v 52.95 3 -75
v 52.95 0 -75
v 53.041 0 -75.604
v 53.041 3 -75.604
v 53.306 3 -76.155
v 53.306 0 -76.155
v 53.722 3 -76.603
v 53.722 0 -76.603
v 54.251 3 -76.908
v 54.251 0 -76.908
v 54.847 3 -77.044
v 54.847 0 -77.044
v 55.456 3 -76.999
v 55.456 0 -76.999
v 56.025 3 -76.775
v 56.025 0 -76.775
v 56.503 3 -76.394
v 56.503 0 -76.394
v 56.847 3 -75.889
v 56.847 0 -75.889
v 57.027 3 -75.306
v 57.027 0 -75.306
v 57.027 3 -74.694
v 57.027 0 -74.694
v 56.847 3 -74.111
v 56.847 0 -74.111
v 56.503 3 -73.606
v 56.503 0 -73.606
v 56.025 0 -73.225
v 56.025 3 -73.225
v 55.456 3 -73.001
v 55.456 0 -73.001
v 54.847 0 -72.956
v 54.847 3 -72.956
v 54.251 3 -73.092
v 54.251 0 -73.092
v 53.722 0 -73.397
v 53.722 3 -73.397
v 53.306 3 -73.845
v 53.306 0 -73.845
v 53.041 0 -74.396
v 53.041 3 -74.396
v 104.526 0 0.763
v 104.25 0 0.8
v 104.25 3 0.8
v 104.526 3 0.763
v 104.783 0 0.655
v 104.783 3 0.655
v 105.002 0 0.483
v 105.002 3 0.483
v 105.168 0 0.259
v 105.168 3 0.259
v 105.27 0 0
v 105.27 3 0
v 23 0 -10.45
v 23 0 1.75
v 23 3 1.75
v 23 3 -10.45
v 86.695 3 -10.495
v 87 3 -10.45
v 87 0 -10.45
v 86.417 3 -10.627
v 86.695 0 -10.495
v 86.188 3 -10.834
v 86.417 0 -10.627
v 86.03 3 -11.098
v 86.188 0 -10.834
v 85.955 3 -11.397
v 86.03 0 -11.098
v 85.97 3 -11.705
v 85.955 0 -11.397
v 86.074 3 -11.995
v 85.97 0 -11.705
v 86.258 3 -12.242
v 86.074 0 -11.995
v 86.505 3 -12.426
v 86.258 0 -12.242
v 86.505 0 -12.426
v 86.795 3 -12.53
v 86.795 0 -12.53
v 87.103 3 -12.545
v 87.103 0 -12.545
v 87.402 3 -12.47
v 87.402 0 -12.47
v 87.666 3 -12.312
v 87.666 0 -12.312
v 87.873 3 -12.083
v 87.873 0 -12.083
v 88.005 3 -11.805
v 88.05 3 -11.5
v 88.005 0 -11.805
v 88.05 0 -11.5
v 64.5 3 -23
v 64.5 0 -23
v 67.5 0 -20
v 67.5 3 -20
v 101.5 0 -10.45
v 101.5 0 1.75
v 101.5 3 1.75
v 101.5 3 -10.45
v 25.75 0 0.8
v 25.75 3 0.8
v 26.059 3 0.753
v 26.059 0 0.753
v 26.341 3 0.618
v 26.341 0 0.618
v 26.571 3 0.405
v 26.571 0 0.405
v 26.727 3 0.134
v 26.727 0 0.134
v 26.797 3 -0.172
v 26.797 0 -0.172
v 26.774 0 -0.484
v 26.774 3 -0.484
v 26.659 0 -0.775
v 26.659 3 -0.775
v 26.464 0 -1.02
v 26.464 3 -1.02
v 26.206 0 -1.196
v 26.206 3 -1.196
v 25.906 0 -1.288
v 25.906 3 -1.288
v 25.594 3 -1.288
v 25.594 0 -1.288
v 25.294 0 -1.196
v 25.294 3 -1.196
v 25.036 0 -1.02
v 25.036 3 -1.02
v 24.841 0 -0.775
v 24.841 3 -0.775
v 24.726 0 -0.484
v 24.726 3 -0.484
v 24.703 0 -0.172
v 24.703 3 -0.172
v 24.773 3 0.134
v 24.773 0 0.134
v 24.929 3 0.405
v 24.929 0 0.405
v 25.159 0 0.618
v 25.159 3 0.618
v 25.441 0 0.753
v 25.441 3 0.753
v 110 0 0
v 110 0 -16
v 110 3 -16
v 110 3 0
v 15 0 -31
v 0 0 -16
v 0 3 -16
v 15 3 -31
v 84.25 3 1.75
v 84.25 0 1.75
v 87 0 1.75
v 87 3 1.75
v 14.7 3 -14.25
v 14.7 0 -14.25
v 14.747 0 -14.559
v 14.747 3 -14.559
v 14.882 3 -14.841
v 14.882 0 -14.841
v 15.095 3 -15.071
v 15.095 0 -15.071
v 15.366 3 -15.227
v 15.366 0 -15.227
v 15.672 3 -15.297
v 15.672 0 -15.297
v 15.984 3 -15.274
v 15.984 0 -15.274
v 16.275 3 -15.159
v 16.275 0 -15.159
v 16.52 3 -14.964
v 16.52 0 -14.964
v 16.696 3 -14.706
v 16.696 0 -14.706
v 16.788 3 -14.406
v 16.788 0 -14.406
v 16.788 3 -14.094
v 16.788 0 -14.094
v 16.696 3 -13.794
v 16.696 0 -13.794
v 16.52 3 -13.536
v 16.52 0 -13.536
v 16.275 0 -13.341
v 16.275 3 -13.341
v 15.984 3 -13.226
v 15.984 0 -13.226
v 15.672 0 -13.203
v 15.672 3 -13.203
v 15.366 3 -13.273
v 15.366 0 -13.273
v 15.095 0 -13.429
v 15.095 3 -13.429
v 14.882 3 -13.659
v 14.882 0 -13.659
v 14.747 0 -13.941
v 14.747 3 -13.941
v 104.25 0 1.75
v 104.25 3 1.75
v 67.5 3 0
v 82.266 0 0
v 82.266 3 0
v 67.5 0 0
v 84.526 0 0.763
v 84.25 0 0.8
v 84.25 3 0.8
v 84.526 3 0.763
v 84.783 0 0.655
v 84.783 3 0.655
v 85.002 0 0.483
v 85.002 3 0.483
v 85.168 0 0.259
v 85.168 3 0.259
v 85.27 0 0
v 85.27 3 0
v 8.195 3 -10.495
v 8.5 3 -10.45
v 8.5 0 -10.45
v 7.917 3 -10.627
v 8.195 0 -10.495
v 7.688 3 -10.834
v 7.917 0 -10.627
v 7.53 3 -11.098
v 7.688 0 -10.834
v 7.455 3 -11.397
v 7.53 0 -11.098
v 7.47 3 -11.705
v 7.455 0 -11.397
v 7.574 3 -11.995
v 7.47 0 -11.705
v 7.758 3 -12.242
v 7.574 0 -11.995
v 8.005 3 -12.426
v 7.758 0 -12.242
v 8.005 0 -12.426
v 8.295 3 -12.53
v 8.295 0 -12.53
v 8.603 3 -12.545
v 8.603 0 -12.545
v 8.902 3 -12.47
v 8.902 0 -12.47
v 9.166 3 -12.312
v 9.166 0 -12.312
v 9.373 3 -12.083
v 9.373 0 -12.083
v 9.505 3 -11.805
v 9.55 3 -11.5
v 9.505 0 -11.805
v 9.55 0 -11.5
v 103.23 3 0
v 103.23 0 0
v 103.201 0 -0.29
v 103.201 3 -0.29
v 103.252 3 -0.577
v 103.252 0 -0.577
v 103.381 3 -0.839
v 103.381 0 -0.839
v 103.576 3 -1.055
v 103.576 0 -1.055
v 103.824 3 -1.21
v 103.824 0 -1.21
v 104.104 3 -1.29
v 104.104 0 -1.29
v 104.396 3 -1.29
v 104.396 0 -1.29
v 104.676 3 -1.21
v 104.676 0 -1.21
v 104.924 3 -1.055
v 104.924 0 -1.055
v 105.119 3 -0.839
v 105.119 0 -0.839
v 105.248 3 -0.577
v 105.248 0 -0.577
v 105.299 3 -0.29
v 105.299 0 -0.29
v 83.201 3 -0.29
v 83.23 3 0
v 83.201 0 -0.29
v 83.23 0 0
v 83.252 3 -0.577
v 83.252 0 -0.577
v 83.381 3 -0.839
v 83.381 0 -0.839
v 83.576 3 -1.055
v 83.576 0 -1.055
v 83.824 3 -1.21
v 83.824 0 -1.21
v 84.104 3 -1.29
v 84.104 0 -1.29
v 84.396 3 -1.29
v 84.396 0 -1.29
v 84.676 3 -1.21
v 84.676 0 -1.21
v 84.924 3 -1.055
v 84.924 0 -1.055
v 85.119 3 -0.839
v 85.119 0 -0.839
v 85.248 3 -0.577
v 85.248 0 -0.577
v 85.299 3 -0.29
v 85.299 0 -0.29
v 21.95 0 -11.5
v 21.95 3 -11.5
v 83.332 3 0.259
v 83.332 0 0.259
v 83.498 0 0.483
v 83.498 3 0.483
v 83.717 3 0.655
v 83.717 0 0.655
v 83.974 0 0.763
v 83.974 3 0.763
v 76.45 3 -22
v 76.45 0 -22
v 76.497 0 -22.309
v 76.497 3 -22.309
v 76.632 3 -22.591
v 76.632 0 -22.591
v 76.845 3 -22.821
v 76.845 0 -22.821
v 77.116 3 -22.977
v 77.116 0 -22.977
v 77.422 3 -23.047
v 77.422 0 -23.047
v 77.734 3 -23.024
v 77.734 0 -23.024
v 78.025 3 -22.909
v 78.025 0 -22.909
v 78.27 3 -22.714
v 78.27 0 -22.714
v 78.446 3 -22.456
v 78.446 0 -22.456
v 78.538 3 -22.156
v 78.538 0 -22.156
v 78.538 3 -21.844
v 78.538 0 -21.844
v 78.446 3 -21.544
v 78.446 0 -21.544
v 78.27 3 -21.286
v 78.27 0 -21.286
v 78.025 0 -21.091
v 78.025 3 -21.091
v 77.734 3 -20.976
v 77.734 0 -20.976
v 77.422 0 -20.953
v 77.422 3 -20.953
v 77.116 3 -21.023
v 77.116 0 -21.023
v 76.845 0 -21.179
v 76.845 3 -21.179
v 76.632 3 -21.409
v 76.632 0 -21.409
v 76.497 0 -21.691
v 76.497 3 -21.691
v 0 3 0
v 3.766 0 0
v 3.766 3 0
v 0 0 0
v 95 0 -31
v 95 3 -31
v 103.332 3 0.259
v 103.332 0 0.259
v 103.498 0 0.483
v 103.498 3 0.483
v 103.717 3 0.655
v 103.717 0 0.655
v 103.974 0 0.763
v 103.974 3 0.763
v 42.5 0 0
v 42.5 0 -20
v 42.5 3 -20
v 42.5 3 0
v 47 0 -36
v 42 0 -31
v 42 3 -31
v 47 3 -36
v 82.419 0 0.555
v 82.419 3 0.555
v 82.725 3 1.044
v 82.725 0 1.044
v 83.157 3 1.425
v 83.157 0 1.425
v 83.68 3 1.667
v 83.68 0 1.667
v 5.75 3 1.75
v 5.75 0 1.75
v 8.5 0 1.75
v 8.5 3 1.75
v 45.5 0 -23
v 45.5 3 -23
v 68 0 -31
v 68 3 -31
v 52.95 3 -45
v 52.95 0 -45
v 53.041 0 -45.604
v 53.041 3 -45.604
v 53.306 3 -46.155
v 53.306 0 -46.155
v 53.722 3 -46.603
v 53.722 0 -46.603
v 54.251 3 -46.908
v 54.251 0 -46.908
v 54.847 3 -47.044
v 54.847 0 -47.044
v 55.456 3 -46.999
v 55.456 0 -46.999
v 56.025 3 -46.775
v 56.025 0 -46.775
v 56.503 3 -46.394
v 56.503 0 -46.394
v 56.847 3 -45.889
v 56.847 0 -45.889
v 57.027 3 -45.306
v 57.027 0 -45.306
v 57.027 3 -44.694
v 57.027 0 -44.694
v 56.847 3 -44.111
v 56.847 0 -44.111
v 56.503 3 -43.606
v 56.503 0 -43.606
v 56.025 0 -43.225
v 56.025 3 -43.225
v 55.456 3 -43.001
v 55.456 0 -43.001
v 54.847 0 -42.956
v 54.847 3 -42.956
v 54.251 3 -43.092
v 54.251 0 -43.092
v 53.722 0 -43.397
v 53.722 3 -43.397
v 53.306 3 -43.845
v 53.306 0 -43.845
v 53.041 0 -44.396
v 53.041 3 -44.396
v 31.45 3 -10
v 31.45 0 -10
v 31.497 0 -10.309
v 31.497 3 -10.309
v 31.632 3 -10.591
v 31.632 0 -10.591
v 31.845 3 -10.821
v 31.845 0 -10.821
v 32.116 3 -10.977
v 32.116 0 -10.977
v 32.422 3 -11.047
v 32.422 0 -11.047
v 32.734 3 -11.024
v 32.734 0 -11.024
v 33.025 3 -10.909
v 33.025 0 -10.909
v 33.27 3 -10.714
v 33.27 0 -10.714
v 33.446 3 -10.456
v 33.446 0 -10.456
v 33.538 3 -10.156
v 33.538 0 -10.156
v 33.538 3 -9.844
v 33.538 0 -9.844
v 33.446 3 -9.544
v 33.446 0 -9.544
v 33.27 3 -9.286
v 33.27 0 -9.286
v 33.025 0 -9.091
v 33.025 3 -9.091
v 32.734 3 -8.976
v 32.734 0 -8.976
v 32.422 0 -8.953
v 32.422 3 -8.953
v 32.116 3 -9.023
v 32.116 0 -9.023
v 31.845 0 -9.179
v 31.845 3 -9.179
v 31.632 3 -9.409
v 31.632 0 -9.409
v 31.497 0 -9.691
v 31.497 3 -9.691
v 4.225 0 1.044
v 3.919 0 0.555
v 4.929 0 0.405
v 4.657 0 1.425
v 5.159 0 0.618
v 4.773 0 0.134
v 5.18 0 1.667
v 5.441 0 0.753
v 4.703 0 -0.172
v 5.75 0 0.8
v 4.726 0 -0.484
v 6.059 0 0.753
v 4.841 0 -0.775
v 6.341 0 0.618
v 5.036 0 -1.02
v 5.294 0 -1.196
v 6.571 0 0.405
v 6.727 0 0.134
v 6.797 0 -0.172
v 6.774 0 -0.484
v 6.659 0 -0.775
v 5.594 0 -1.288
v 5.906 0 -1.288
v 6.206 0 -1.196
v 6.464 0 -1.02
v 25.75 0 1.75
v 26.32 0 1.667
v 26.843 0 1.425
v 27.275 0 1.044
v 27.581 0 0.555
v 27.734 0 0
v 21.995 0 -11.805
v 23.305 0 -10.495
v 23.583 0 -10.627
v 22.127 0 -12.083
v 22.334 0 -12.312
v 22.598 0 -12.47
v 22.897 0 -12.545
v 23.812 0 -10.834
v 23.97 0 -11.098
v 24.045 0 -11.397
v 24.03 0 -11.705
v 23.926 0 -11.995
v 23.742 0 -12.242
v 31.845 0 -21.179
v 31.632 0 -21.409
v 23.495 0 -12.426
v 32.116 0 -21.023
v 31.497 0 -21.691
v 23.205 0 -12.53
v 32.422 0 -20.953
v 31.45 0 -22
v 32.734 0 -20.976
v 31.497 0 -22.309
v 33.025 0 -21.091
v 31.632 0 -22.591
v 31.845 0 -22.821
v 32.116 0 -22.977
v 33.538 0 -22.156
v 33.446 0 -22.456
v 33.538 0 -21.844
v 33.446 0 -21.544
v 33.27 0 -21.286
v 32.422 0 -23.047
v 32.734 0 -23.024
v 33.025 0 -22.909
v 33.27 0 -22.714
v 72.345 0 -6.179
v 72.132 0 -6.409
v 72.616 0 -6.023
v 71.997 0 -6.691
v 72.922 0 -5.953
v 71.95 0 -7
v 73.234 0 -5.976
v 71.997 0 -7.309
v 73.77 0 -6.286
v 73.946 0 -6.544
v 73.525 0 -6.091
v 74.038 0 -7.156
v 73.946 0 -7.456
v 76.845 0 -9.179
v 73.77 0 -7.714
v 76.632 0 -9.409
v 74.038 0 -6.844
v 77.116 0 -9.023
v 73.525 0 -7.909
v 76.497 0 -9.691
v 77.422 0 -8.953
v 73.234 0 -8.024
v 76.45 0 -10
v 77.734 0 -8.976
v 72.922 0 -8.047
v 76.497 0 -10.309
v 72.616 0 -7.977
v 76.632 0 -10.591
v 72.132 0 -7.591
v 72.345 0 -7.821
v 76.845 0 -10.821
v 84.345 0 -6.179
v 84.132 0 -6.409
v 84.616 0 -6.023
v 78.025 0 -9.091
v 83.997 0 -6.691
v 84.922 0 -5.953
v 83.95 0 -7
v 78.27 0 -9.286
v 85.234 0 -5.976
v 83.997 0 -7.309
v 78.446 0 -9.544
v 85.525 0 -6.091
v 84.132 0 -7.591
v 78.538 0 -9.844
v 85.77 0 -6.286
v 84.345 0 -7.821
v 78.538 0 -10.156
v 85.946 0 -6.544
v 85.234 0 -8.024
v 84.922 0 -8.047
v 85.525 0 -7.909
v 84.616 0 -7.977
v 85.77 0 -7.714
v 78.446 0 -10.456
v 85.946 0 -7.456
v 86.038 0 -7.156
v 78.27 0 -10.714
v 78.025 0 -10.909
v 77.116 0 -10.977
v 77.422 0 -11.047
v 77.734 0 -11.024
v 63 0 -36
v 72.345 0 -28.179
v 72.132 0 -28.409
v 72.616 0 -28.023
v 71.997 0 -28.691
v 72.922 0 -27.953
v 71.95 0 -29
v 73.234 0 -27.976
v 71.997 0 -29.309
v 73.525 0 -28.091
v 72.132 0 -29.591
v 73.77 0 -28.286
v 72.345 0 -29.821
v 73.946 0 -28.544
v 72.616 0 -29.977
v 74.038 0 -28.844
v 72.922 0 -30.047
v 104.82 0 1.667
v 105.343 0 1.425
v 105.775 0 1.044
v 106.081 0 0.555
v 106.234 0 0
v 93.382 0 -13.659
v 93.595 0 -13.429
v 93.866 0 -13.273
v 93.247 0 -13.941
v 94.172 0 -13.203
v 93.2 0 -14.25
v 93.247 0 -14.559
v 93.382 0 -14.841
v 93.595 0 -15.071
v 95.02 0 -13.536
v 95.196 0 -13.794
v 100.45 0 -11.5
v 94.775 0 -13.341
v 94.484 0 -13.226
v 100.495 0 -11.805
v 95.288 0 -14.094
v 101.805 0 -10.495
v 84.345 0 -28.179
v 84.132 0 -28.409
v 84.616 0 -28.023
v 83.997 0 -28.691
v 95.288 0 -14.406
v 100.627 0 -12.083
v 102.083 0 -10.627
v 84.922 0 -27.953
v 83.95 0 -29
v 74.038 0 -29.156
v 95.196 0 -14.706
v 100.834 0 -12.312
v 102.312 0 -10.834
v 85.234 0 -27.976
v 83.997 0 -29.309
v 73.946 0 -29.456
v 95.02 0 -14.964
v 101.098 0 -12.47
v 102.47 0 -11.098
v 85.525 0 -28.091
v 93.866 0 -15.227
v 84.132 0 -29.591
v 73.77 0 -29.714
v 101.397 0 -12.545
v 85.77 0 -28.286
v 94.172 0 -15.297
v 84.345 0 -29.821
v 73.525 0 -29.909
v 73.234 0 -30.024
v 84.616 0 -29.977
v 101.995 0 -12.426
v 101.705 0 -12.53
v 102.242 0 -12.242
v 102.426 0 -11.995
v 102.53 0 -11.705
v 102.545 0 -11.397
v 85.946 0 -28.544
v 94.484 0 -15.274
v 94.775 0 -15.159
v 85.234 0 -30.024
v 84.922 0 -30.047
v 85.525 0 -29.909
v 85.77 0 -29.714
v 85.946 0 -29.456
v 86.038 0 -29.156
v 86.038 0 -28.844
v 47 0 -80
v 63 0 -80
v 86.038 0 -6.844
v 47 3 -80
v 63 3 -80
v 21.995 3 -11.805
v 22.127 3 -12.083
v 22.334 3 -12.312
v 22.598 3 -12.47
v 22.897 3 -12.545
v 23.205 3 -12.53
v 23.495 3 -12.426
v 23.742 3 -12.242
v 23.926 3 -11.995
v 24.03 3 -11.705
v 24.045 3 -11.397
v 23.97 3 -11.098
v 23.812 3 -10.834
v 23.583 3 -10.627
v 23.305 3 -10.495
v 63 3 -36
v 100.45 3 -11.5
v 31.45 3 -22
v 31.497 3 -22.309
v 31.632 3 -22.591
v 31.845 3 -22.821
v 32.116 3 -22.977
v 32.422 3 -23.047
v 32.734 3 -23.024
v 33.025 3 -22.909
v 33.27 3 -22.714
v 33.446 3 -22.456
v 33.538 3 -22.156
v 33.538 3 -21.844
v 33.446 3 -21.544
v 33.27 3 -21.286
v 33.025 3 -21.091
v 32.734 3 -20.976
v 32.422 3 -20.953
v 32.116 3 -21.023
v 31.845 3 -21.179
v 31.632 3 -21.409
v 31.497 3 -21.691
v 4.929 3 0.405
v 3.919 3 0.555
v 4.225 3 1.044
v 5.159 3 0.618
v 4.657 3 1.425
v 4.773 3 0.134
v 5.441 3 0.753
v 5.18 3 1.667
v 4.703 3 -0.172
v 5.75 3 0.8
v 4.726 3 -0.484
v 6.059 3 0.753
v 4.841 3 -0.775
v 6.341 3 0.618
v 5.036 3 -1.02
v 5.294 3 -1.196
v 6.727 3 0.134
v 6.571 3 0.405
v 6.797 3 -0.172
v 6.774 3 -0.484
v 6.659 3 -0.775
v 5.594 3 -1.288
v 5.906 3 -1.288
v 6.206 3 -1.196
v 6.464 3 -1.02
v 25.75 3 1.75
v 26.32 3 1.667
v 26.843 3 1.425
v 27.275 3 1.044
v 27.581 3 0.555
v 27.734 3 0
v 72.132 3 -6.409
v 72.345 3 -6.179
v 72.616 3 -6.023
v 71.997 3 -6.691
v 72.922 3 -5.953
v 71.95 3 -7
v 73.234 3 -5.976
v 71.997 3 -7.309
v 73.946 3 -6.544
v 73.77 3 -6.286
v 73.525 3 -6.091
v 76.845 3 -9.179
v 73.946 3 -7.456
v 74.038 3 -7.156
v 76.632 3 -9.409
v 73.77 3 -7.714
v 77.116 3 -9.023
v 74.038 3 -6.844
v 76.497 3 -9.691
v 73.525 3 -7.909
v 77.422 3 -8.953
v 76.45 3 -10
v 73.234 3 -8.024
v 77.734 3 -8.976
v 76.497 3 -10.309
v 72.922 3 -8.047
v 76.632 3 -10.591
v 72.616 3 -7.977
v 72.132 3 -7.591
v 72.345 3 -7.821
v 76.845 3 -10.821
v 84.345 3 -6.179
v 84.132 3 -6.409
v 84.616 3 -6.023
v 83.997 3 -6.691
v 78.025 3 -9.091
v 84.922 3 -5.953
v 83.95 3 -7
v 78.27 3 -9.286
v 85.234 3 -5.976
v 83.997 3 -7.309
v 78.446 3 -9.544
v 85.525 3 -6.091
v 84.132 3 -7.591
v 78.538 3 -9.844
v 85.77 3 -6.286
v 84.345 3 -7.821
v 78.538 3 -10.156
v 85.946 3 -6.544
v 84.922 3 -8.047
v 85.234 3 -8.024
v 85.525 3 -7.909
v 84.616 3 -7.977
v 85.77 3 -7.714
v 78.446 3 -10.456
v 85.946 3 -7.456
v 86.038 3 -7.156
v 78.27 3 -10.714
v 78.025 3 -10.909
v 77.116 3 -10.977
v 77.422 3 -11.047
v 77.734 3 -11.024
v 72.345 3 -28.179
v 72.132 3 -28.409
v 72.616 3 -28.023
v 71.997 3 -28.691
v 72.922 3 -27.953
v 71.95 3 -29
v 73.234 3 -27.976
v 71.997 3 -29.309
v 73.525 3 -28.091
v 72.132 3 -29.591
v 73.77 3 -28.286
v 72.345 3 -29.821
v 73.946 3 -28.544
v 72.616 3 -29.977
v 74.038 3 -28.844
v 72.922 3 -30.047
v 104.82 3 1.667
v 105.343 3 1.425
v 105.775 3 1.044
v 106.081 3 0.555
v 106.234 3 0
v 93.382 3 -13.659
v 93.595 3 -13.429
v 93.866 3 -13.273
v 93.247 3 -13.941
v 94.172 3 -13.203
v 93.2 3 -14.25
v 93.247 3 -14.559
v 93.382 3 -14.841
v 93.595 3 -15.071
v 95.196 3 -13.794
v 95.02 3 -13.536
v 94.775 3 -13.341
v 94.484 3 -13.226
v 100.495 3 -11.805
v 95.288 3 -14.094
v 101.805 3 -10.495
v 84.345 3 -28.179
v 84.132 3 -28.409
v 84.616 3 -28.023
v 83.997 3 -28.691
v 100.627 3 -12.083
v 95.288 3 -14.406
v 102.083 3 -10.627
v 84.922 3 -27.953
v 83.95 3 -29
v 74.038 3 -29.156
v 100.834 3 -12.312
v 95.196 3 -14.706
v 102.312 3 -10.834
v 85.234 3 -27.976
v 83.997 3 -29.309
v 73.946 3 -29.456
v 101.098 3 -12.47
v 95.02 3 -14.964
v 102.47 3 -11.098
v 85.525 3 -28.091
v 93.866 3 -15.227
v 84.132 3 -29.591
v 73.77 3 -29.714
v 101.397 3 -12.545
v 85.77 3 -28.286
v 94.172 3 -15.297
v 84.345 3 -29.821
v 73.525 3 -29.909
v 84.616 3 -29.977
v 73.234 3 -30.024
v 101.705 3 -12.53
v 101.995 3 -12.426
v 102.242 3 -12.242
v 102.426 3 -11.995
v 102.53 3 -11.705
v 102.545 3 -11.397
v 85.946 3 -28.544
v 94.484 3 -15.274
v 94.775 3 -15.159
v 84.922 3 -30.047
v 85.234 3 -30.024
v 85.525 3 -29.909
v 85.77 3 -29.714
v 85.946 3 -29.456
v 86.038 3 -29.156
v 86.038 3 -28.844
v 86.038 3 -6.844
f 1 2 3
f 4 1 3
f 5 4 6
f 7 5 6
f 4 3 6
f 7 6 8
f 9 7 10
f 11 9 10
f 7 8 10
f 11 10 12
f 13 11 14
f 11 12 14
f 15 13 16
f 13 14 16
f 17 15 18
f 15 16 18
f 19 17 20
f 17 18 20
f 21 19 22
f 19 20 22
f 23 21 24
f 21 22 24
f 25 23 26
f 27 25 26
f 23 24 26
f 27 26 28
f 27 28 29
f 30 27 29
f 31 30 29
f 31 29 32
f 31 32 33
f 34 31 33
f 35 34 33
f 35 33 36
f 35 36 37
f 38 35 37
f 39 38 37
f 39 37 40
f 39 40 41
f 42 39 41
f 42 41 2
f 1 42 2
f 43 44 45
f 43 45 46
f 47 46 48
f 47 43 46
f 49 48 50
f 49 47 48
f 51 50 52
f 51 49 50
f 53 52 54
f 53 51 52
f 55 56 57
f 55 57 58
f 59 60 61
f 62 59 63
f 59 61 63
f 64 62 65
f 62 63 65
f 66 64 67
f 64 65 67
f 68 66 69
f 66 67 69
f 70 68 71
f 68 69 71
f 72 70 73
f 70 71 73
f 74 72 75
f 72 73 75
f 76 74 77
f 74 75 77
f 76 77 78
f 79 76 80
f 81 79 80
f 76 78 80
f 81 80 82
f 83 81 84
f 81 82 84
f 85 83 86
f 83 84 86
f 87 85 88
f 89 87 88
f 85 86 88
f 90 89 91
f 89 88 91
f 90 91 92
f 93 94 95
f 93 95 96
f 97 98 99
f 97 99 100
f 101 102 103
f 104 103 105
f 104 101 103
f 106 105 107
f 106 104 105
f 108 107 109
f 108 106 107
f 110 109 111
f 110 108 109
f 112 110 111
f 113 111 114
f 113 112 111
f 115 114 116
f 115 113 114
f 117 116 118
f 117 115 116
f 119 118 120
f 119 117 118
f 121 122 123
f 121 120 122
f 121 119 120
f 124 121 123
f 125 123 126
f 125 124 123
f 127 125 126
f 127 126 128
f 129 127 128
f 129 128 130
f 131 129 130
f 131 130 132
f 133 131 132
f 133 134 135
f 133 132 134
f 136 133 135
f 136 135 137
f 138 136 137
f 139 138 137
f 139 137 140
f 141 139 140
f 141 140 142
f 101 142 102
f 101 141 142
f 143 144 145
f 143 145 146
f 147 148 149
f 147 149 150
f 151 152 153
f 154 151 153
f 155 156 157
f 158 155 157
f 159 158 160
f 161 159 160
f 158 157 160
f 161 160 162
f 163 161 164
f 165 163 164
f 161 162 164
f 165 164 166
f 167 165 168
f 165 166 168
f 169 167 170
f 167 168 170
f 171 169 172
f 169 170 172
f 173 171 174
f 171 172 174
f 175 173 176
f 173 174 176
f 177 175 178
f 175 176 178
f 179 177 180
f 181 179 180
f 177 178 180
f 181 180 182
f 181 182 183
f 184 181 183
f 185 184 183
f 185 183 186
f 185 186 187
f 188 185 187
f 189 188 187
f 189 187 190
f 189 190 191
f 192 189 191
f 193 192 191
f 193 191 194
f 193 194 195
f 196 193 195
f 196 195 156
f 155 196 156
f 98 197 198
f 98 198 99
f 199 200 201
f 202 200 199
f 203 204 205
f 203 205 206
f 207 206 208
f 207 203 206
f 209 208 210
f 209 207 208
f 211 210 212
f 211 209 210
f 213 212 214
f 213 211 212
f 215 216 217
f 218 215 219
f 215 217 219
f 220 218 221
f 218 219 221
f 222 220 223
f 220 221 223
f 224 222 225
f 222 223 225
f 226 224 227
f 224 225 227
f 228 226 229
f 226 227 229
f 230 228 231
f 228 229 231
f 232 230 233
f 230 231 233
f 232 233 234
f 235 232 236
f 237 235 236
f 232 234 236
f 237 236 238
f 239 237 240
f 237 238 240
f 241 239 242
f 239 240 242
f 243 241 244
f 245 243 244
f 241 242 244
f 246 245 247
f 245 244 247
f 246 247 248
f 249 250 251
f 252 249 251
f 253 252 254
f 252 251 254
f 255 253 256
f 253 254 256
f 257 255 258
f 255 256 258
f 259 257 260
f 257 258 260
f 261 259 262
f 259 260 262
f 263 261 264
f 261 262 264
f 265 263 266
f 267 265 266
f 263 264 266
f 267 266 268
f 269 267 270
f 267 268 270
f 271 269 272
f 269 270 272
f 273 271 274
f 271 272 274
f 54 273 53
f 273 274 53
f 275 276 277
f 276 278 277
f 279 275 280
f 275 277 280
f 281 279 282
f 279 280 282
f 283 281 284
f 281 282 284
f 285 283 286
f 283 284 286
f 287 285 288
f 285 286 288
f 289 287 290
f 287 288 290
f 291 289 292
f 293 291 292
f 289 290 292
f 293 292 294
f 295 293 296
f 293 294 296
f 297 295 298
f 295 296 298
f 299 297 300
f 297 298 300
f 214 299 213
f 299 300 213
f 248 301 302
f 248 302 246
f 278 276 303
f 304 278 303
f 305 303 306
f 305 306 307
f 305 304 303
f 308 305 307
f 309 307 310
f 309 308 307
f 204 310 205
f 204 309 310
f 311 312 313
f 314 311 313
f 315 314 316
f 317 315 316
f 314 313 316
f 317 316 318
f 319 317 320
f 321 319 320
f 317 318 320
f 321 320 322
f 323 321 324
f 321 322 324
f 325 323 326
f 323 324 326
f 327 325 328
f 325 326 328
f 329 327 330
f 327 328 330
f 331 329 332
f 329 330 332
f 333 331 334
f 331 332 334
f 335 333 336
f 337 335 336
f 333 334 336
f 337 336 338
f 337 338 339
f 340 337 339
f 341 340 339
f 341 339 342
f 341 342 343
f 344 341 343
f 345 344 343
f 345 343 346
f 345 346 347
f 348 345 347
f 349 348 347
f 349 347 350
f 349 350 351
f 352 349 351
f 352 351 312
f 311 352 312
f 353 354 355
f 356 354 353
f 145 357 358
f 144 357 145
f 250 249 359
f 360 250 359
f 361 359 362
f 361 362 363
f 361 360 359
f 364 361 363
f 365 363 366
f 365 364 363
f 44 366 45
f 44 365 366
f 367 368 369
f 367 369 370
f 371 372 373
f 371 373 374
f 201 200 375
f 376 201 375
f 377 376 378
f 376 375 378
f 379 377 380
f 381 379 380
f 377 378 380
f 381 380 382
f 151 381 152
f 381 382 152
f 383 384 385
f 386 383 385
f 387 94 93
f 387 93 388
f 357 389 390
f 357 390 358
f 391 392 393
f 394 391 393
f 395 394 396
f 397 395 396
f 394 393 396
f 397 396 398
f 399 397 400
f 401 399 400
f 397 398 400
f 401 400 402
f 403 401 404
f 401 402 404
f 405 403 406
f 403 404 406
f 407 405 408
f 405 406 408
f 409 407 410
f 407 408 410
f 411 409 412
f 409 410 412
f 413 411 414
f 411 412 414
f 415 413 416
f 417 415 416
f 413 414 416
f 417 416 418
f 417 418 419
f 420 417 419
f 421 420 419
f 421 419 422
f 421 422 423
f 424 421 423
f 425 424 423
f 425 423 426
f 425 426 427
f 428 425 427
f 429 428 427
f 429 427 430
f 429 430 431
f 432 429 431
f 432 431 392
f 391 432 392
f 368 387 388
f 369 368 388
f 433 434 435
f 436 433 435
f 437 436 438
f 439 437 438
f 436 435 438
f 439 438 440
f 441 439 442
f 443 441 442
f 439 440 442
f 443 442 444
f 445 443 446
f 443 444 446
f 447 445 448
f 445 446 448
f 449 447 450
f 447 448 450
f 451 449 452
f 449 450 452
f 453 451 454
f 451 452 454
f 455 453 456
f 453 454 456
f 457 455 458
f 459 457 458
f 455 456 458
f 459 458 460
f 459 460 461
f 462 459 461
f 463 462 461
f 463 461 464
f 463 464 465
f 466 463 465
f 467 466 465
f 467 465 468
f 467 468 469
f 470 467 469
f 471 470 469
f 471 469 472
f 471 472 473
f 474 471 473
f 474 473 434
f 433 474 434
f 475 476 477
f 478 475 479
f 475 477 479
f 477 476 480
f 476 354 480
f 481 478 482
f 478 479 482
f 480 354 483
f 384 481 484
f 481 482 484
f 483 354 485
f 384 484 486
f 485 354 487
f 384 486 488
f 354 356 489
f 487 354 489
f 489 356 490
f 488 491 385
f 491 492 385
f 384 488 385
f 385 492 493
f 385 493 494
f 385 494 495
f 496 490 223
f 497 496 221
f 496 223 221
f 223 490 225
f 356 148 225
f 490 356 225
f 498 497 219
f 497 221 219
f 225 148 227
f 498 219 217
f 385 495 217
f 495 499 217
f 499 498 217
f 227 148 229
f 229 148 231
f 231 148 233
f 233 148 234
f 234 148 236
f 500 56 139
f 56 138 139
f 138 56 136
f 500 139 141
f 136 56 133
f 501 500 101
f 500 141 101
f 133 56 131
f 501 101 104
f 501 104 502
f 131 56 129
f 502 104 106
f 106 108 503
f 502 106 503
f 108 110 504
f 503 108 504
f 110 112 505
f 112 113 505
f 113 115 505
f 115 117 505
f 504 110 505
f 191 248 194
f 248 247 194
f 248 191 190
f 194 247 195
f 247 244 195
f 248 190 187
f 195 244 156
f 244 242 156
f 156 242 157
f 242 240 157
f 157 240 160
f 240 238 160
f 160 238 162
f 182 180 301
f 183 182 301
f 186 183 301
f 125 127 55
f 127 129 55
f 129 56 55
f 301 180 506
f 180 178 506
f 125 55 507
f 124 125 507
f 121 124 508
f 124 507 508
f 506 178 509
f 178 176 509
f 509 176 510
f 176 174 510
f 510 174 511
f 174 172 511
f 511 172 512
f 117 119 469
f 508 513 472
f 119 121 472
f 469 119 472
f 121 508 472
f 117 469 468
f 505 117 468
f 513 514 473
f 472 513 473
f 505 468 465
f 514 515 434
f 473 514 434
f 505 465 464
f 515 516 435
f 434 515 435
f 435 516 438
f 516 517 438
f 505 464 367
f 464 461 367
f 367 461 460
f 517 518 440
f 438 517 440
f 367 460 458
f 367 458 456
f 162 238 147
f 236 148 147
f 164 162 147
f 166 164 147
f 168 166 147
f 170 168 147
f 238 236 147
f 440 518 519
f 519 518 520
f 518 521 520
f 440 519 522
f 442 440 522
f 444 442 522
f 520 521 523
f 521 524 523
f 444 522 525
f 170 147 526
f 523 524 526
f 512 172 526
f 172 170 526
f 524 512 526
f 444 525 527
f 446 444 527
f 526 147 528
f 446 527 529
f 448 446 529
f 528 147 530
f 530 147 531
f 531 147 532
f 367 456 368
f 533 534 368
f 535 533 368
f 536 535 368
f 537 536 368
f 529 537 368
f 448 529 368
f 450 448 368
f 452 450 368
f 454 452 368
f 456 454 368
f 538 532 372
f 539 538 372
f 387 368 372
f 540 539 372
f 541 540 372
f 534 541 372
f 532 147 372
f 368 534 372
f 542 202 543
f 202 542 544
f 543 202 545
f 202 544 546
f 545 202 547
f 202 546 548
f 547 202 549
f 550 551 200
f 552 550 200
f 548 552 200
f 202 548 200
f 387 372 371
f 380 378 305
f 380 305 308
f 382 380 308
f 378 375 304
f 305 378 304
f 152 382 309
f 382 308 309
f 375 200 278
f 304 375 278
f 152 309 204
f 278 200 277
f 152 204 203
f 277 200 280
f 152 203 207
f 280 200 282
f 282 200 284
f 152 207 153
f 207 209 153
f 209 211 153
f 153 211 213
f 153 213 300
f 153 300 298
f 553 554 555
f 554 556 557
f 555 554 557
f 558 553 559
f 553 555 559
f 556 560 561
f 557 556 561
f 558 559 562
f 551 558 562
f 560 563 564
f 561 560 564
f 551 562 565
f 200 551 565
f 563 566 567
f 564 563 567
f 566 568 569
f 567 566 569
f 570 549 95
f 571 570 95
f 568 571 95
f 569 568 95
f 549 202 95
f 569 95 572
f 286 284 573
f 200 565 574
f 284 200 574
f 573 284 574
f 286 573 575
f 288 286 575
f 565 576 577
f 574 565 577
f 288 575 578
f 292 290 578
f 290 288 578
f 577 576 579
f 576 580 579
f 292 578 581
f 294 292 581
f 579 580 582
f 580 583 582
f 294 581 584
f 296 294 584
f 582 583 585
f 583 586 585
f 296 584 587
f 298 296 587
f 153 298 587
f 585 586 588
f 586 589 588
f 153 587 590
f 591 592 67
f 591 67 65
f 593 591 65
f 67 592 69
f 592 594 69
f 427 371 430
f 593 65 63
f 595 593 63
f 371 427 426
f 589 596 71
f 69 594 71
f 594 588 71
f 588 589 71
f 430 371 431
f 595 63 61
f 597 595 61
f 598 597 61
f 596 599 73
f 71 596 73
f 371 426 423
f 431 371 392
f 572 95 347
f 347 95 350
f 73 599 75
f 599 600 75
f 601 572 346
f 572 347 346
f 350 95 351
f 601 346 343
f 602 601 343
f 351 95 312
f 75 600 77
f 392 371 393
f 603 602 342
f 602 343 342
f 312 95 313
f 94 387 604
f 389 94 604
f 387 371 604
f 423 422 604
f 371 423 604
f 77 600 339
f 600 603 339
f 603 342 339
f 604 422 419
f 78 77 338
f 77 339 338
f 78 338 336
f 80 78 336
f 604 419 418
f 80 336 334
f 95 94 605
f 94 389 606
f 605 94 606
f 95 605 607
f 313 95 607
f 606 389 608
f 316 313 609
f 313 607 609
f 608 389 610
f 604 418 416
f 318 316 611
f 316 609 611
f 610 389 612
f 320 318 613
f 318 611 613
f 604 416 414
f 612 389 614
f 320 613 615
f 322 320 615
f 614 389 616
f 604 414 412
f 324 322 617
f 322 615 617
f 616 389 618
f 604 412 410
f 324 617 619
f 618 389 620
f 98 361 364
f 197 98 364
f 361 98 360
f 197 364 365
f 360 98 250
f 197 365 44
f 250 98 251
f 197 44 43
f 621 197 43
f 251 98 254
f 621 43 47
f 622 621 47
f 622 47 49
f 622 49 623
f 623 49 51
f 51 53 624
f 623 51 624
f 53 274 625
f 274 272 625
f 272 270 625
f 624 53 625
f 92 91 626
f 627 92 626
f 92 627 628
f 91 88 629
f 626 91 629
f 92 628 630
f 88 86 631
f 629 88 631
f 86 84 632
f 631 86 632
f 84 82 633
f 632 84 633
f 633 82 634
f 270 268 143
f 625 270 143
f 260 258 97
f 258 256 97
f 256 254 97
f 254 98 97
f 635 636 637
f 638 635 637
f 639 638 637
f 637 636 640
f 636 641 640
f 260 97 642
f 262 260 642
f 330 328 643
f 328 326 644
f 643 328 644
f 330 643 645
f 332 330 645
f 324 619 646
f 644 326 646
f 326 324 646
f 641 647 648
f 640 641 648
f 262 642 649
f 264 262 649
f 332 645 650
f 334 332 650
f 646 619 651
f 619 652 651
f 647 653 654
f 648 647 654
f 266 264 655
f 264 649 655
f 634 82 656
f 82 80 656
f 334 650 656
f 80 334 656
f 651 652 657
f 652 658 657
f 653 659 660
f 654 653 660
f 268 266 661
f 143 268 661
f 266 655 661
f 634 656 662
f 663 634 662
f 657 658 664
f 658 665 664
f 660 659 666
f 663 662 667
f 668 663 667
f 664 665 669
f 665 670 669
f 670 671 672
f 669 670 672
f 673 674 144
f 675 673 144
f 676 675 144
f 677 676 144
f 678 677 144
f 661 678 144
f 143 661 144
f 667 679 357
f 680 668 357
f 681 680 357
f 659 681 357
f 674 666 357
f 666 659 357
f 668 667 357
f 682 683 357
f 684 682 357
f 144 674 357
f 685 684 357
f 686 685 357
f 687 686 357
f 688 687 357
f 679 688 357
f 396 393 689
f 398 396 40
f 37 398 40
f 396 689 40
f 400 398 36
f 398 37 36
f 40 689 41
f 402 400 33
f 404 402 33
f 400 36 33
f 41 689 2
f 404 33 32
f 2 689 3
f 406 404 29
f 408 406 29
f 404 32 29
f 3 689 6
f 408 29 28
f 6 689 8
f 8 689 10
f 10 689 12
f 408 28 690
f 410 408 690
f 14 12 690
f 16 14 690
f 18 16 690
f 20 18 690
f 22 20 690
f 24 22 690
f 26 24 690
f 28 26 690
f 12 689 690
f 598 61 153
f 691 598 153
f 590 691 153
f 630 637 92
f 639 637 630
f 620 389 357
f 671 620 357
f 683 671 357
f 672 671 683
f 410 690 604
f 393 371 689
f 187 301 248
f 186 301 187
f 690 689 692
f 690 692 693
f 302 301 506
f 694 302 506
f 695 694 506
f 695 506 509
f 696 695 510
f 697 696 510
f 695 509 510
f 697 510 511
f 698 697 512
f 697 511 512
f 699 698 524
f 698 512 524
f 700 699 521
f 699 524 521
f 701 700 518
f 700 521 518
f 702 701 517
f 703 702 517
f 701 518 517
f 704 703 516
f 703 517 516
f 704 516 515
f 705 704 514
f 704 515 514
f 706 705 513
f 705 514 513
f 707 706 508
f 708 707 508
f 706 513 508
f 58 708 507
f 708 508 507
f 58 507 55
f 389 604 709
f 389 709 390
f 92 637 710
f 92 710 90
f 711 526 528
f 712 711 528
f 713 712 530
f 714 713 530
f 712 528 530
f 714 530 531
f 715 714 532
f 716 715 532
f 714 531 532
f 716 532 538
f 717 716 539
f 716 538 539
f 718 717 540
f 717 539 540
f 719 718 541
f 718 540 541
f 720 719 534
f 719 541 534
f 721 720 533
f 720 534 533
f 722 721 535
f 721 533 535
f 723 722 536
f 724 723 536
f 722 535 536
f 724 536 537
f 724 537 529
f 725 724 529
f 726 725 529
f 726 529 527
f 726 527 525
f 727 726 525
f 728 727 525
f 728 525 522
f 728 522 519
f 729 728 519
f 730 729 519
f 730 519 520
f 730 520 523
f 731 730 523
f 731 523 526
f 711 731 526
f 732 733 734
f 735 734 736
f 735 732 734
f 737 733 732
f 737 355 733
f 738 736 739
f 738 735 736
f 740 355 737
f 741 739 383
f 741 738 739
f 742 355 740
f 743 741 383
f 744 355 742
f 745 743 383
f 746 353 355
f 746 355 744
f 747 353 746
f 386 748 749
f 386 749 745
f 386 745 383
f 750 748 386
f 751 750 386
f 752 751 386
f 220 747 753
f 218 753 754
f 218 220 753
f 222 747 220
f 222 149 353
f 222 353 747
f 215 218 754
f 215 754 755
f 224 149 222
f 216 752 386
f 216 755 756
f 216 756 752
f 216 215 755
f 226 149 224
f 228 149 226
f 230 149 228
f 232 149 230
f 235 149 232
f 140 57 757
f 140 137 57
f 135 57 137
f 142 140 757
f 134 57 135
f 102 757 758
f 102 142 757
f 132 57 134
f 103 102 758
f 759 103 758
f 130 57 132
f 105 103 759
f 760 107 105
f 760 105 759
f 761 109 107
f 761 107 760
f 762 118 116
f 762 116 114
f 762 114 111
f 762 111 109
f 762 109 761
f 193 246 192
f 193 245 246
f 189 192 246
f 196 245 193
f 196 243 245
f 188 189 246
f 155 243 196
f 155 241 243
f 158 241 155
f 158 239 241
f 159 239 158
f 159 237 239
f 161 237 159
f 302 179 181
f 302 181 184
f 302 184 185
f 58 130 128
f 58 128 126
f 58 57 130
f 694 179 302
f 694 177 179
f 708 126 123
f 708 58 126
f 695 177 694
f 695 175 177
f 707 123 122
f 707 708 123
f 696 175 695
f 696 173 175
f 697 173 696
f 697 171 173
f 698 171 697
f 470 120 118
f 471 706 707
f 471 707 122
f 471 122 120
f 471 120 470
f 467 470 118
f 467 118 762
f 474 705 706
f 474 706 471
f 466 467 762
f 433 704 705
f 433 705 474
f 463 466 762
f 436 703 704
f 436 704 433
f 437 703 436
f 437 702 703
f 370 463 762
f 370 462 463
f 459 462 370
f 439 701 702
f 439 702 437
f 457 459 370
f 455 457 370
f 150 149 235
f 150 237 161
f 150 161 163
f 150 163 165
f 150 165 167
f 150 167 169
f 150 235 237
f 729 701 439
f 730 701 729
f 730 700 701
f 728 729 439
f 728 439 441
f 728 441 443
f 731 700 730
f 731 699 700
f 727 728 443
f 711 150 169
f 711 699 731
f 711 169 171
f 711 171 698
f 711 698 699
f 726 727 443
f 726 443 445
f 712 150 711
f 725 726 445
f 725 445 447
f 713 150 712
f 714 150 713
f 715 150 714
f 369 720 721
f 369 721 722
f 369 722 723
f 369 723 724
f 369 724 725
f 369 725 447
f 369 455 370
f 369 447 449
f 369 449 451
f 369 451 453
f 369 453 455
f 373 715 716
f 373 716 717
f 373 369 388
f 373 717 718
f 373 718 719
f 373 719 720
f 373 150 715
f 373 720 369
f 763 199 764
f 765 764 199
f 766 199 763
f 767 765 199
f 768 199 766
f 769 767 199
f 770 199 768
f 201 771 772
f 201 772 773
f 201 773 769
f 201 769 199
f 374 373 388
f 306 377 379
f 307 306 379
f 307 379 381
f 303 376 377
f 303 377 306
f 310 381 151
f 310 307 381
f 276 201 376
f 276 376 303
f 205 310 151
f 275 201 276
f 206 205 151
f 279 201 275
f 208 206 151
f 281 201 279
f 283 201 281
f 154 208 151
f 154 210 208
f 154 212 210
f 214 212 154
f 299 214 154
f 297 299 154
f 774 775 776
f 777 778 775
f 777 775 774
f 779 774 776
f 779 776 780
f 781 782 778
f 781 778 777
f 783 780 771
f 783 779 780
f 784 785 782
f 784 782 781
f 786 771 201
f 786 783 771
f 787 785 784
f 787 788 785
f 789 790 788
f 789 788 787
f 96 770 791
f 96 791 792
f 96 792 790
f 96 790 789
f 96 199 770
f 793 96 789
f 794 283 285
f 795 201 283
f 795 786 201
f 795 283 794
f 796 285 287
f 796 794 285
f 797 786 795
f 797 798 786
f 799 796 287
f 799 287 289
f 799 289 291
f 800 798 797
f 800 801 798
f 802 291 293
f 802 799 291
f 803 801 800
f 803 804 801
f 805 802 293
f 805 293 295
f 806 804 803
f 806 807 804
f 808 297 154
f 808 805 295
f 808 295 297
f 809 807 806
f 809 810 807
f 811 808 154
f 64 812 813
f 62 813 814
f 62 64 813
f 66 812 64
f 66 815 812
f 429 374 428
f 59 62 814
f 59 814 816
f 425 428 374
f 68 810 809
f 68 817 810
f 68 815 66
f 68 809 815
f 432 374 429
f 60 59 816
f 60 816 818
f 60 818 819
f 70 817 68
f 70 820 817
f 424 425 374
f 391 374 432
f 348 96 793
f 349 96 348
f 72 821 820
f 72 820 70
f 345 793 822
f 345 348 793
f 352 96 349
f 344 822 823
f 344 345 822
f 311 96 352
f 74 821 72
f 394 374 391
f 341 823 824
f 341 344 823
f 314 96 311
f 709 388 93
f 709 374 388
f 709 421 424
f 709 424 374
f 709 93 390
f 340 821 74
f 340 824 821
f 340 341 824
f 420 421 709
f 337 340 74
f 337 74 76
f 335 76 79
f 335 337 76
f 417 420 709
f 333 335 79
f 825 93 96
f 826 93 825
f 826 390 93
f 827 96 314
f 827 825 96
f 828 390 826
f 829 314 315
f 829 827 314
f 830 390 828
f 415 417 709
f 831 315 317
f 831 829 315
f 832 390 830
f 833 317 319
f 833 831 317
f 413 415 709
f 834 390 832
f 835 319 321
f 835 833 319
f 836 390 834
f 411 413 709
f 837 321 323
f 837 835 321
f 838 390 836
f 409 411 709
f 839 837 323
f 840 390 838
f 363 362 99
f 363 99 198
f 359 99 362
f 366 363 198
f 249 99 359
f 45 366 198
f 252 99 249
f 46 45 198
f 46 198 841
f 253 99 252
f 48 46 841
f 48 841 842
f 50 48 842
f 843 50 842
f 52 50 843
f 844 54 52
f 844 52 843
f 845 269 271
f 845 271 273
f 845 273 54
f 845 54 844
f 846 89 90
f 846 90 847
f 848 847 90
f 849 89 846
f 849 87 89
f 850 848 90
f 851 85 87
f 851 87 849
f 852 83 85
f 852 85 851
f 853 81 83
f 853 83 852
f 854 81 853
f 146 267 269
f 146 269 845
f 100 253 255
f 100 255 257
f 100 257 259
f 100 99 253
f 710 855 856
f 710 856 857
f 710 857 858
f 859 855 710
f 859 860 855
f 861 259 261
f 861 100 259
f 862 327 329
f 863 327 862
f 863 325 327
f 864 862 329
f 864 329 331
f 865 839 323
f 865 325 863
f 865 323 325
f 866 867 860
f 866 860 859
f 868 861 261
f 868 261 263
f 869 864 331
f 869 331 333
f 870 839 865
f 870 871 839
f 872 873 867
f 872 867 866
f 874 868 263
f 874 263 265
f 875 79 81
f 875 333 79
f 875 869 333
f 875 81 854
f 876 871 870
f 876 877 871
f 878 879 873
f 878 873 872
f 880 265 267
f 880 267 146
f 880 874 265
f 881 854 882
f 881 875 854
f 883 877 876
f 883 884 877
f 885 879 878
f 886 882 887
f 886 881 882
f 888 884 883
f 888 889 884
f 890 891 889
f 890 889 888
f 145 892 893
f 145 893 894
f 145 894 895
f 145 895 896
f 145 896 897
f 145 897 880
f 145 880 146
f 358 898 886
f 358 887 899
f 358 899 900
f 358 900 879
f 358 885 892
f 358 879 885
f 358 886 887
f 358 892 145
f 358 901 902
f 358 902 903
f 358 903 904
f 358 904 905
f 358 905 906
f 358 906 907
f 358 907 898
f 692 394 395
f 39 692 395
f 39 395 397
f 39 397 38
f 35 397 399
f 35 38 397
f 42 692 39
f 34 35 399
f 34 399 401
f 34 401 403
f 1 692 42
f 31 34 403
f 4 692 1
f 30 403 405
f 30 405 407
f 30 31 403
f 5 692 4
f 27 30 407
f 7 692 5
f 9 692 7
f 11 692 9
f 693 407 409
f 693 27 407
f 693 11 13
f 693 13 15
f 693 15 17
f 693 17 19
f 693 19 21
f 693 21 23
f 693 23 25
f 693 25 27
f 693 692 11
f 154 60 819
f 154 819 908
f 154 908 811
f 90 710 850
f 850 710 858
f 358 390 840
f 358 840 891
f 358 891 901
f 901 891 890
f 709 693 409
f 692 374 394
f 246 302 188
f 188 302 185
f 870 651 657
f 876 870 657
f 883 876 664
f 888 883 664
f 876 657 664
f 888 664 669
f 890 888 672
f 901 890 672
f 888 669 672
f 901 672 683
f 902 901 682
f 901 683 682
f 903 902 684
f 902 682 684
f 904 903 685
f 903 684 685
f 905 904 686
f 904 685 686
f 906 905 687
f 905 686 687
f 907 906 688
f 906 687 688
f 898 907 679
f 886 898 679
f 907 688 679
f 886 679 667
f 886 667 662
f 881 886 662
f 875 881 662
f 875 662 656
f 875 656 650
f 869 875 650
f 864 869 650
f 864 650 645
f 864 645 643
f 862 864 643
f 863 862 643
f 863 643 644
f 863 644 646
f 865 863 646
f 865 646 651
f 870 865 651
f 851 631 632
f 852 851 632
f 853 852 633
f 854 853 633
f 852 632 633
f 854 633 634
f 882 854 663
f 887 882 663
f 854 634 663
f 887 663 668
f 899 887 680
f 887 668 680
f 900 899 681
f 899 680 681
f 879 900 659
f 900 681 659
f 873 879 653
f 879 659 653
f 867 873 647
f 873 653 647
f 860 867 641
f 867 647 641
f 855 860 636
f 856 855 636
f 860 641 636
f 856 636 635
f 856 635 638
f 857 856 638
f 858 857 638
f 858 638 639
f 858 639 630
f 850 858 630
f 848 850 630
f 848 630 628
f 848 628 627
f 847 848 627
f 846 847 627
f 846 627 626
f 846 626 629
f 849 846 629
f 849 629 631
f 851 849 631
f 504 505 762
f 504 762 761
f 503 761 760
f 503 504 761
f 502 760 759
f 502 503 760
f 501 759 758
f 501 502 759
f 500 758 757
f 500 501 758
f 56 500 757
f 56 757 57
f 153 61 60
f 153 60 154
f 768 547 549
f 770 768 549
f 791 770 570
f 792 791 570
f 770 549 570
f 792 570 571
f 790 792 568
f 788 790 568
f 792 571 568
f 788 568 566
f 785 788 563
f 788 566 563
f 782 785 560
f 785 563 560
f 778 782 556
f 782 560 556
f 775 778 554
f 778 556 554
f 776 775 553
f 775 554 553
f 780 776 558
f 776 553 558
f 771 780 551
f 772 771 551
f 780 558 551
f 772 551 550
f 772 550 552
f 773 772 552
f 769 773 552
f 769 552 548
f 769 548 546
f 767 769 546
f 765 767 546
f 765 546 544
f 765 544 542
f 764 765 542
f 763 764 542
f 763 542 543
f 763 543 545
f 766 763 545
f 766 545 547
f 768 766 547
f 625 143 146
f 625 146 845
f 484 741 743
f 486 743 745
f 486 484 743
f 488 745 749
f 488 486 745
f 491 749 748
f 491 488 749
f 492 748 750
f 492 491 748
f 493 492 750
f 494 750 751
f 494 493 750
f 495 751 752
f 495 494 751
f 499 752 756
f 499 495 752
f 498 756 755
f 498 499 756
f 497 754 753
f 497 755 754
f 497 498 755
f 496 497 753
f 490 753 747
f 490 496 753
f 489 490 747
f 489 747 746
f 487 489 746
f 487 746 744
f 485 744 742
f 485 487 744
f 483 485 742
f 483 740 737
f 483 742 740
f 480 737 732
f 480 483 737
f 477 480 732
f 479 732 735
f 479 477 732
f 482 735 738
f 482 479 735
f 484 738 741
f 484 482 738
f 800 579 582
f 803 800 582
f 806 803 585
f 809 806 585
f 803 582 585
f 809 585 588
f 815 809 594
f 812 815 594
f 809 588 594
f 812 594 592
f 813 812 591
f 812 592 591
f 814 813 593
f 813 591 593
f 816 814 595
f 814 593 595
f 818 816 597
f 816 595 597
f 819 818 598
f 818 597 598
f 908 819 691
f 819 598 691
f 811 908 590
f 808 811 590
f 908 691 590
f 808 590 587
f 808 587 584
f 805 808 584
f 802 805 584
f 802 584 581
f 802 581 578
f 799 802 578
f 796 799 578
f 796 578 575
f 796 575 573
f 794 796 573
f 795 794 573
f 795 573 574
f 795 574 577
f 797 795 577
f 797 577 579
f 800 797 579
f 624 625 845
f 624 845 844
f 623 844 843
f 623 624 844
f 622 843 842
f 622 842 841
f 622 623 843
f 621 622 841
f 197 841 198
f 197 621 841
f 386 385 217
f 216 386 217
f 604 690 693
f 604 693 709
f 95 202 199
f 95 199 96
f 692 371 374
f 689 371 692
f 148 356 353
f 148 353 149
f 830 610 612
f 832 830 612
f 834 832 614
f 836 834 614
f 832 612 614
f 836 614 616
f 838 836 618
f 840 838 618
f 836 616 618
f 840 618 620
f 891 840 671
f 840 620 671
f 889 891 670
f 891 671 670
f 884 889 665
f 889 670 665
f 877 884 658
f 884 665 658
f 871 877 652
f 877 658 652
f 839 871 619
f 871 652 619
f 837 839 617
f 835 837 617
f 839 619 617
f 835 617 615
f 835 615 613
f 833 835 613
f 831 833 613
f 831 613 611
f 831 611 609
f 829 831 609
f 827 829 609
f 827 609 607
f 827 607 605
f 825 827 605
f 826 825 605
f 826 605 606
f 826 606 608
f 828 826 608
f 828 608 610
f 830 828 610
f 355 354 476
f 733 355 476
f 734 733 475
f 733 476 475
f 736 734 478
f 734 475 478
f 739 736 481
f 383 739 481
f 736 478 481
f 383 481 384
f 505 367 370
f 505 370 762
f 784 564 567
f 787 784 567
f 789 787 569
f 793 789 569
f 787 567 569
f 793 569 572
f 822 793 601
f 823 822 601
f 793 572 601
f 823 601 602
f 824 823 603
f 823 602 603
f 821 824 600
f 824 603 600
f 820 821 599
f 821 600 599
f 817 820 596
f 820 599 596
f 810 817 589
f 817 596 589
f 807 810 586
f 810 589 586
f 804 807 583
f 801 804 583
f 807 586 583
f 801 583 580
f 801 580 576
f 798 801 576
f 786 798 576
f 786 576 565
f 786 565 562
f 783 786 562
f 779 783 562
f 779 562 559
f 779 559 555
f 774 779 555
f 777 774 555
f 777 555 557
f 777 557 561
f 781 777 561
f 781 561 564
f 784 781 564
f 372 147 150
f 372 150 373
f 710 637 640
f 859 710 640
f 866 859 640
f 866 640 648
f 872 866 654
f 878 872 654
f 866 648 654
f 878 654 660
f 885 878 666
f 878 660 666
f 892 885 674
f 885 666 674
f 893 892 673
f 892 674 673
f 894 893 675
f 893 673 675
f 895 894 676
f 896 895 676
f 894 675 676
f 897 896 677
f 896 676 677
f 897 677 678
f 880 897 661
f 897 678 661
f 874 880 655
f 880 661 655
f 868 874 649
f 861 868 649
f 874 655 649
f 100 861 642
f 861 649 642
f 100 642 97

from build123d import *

# Parameters (mm, degrees)
EXTRUDE_6_DEPTH         = 3
HOLE_WIZARD_4_1_4_1_1_D = 4.1
HOLE_WIZARD_2_1_2_1_1_D = 2.1
EXTRUDE_START           = -3
SKETCH_39_R             = 1.05
EXTRUDE_7_DEPTH         = 3
HOLE_WIZARD_2_1_2_1_2_D = 2.1
CHAMFER_3_SIZE          = 3


with BuildPart() as part:
    # 草图33 → 凸台-拉伸6 (new body)
    with BuildSketch(Plane(origin=(0, 0, 0), x_dir=(1, 0, 0), z_dir=(0, 1, 0))):
        Polygon((110, 16), (110, 0), (101.5, 0), (101.5, 11.5), (87, 11.5), (87, 0), (67.5, 0), (67.5, 23), (42.5, 23), (42.5, 0), (23, 0), (23, 11.5), (8.5, 11.5), (8.5, 0), (0, 0), (0, 16), (15, 31), (42, 31), (47, 36), (47, 80), (63, 80), (63, 36), (68, 31), (95, 31), align=None)
    extrude(amount=EXTRUDE_6_DEPTH)

    # Ø4.1 (4.1) 直径孔1 (through all)
    with Locations(Plane(origin=(0, 3, 0), x_dir=(1, 0, 0), z_dir=(0, 1, 0))):
        with Locations((55, 75), (55, 45)):
            Hole(HOLE_WIZARD_4_1_4_1_1_D / 2)

    # Ø2.1 (2.1) 直径孔1 (through all)
    with Locations(Plane(origin=(0, 3, 0), x_dir=(1, 0, 0), z_dir=(0, 1, 0))):
        with Locations((32.5, 10), (5.75, 0.25), (15.75, 14.25), (25.75, 0.25), (94.25, 14.25), (104.25, 0.25), (84.25, 0.25), (73, 29), (85, 7), (73, 7), (85, 29), (32.5, 22), (77.5, 22), (77.5, 10)):
            Hole(HOLE_WIZARD_2_1_2_1_1_D / 2)

    # 草图39 → 凸台-拉伸7 (add)
    # profile 1 of 4: a face of its own
    with BuildSketch(Plane(origin=(0, 3, 0), x_dir=(1, 0, 0), z_dir=(0, 1, 0)).offset(EXTRUDE_START)):
        with BuildLine():
            Line((5.75, -1.75), (8.5, -1.75))
            Line((8.5, -1.75), (8.5, 0))
            Line((8.5, 0), (7.734313483, 0))
            ThreePointArc((7.734313483, 0), (4.427124344, 1.75), (5.75, -1.75))
        make_face()
        with Locations(Location((5.75, 0.25, 0), (0, 0, 270))):
            Circle(SKETCH_39_R, mode=Mode.SUBTRACT)
    # profile 2 of 4: a face of its own
    with BuildSketch(Plane(origin=(0, 3, 0), x_dir=(1, 0, 0), z_dir=(0, 1, 0)).offset(EXTRUDE_START)):
        with BuildLine():
            Line((25.75, -1.75), (23, -1.75))
            Line((23, -1.75), (23, 0))
            Line((23, 0), (23.765686517, 0))
            ThreePointArc((23.765686517, 0), (27.072875656, 1.75), (25.75, -1.75))
        make_face()
        with Locations(Location((25.75, 0.25, 0), (0, 0, 270))):
            Circle(SKETCH_39_R, mode=Mode.SUBTRACT)
    # profile 3 of 4: a face of its own
    with BuildSketch(Plane(origin=(0, 3, 0), x_dir=(1, 0, 0), z_dir=(0, 1, 0)).offset(EXTRUDE_START)):
        with BuildLine():
            Line((101.5, 0), (102.265686517, 0))
            ThreePointArc((102.265686517, 0), (105.572875656, 1.75), (104.25, -1.75))
            Line((104.25, -1.75), (101.5, -1.75))
            Line((101.5, -1.75), (101.5, 0))
        make_face()
        with Locations(Location((104.25, 0.25, 0), (0, 0, 270))):
            Circle(SKETCH_39_R, mode=Mode.SUBTRACT)
    # profile 4 of 4: a face of its own
    with BuildSketch(Plane(origin=(0, 3, 0), x_dir=(1, 0, 0), z_dir=(0, 1, 0)).offset(EXTRUDE_START)):
        with BuildLine():
            Line((84.25, -1.75), (87, -1.75))
            Line((87, -1.75), (87, 0))
            Line((87, 0), (86.234313483, 0))
            ThreePointArc((86.234313483, 0), (82.927124344, 1.75), (84.25, -1.75))
        make_face()
        with Locations(Location((84.25, 0.25, 0), (0, 0, 270))):
            Circle(SKETCH_39_R, mode=Mode.SUBTRACT)
    extrude(amount=EXTRUDE_7_DEPTH)

    # Ø2.1 (2.1) 直径孔2 (through all)
    with Locations(Plane(origin=(0, 3, 0), x_dir=(1, 0, 0), z_dir=(0, 1, 0))):
        with Locations((8.5, 11.5), (23, 11.5), (87, 11.5), (101.5, 11.5)):
            Hole(HOLE_WIZARD_2_1_2_1_2_D / 2)

    # 倒角3
    chamfer_3_edges = [part.edges().sort_by_distance(p)[0] for p in [
        (67.5, 1.5, -23),
        (42.5, 1.5, -23),
    ]]
    chamfer(chamfer_3_edges, length=CHAMFER_3_SIZE)


solid = part.part
